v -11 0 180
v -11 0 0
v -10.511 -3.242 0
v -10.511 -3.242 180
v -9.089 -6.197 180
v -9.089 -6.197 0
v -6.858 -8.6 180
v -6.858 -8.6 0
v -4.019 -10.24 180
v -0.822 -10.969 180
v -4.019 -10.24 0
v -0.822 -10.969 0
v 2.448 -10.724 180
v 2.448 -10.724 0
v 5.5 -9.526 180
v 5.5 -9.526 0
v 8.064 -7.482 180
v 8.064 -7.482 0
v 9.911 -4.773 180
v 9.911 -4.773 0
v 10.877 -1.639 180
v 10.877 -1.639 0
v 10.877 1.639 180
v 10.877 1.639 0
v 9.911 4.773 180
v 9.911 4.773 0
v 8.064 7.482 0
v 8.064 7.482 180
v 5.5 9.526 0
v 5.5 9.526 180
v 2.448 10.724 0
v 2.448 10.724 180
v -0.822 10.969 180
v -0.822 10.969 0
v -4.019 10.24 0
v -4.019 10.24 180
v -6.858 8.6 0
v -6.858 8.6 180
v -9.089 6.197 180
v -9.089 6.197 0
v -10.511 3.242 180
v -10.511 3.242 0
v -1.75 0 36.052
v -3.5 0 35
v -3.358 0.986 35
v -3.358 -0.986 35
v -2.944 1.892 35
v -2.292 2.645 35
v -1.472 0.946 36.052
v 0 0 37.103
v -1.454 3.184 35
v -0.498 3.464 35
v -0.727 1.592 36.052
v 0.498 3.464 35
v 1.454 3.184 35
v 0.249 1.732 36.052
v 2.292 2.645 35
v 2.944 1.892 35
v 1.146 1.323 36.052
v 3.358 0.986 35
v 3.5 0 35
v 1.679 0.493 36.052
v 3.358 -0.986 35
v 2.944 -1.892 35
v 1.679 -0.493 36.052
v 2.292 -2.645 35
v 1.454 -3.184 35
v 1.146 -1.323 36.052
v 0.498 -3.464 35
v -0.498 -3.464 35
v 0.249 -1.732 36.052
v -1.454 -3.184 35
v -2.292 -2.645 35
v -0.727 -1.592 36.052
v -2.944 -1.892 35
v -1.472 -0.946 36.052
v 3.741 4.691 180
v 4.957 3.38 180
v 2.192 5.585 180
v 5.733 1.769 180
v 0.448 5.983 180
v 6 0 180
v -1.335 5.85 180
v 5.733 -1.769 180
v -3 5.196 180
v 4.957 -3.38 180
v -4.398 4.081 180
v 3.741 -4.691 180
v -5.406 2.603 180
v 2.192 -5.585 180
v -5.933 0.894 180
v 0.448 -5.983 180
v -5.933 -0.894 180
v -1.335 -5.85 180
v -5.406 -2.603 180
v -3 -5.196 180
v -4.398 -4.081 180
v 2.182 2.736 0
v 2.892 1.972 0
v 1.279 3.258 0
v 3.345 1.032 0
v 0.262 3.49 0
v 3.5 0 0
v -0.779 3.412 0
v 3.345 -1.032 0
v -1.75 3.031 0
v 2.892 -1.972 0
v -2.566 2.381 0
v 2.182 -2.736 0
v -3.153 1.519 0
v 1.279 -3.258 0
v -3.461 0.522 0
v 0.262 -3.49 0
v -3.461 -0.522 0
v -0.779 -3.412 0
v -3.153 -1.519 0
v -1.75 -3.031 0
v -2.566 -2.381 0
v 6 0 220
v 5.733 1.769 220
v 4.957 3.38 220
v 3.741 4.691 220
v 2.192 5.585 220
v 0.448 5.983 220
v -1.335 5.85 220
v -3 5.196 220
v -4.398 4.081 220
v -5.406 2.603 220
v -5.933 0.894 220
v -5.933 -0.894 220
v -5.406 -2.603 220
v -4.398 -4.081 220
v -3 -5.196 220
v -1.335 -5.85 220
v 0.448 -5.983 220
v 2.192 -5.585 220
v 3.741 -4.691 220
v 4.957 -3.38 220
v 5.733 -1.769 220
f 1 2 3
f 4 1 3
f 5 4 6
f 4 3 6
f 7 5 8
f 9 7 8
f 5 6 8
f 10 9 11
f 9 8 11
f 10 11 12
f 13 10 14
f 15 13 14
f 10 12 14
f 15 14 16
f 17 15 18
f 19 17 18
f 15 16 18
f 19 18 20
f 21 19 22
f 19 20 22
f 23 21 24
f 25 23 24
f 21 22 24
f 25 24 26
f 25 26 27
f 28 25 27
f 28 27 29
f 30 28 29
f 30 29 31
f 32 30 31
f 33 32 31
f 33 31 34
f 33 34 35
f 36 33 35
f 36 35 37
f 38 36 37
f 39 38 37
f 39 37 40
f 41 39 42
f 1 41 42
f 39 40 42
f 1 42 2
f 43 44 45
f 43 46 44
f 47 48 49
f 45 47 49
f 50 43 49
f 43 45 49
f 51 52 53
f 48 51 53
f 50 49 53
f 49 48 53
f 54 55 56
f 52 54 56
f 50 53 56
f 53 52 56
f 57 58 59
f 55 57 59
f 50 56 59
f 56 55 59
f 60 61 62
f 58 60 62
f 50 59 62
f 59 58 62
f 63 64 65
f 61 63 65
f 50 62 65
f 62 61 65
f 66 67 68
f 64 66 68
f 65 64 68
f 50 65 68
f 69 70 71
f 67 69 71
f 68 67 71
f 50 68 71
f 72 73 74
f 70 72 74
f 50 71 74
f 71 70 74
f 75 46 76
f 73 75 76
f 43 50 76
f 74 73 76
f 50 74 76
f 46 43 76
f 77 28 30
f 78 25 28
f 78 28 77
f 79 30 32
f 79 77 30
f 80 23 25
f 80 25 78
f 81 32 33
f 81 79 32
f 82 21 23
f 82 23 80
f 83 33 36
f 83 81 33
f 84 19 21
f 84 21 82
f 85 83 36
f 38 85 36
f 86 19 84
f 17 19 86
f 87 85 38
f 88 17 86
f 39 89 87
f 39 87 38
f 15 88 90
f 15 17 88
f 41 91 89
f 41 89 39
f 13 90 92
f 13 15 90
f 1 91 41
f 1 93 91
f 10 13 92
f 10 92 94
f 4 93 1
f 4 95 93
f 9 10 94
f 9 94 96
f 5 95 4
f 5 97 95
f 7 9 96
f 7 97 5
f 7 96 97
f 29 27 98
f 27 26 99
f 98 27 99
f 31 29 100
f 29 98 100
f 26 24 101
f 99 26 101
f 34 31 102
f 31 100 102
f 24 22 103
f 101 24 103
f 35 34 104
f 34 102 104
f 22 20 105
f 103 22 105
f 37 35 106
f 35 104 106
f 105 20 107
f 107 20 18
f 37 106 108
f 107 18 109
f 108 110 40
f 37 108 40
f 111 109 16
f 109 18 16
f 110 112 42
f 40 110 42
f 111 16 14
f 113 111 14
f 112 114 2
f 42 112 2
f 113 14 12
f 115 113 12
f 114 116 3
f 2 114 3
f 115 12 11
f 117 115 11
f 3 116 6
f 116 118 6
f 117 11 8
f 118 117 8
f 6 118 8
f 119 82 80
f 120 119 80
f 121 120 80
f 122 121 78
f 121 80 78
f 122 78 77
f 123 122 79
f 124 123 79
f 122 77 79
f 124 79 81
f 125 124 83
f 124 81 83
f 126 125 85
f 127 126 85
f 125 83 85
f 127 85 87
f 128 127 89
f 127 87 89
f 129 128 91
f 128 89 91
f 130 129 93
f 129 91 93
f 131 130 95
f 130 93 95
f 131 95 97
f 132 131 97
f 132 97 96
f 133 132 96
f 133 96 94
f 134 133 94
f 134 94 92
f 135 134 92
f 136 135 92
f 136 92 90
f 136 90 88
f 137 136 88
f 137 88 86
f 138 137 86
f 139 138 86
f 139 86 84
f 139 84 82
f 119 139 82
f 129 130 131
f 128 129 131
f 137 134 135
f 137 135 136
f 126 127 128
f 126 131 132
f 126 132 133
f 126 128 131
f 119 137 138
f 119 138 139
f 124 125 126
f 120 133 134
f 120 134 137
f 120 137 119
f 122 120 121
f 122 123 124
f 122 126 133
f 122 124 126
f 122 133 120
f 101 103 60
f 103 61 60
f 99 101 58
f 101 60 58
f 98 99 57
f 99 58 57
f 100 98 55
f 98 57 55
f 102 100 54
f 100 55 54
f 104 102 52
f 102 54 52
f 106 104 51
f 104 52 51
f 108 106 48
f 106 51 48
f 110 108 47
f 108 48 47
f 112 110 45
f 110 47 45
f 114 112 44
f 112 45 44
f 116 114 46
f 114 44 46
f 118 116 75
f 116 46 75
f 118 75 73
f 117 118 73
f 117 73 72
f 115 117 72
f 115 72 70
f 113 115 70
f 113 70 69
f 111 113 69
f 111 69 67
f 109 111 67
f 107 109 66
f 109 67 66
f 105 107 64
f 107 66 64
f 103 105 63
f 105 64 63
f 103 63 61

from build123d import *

# Parameters (mm, degrees)
ESBO_O2_R                     = 11
RESSALTO_EXTRUS_O1_DEPTH      = 180
ESBO_O11_R                    = 6
RESSALTO_EXTRUS_O4_DEPTH      = 41
CORTE_EXTRUS_O1_START         = -1
ESBO_O15_R                    = 6
CORTE_EXTRUS_O1_DEPTH         = 1
FURO_ROSCADO_DE_M8X1_01_D     = 7
FURO_ROSCADO_DE_M8X1_01_DEPTH = 35
FURO_ROSCADO_DE_M8X1_01_TIP   = 2.103012167


with BuildPart() as part:
    # Esboço2 → Ressalto-extrusão1 (new body)
    with BuildSketch(Plane.XY):
        with Locations(Location((0, 0, 0), (0, 0, 180))):
            Circle(ESBO_O2_R)
    extrude(amount=RESSALTO_EXTRUS_O1_DEPTH)

    # Esboço11 → Ressalto-extrusão4 (add)
    with BuildSketch(Plane.XY.offset(180)):
        Circle(ESBO_O11_R)
    extrude(amount=RESSALTO_EXTRUS_O4_DEPTH)

    # Esboço15 → Corte-extrusão1 (cut)
    with BuildSketch(Plane.XY.offset(221).offset(CORTE_EXTRUS_O1_START)):
        Circle(ESBO_O15_R)
    extrude(amount=CORTE_EXTRUS_O1_DEPTH, mode=Mode.SUBTRACT)

    # Furo roscado de M8x1.01
    with Locations(Plane(origin=(0, 0, 0), x_dir=(-1, 0, 0), z_dir=(0, 0, -1))):
        with Locations((0, 0)):
            Hole(FURO_ROSCADO_DE_M8X1_01_D / 2, depth=FURO_ROSCADO_DE_M8X1_01_DEPTH)
            with Locations((0, 0, -(FURO_ROSCADO_DE_M8X1_01_DEPTH + FURO_ROSCADO_DE_M8X1_01_TIP / 2))):  # 118° drill point
                Cone(0, FURO_ROSCADO_DE_M8X1_01_D / 2, FURO_ROSCADO_DE_M8X1_01_TIP, mode=Mode.SUBTRACT)


solid = part.part
